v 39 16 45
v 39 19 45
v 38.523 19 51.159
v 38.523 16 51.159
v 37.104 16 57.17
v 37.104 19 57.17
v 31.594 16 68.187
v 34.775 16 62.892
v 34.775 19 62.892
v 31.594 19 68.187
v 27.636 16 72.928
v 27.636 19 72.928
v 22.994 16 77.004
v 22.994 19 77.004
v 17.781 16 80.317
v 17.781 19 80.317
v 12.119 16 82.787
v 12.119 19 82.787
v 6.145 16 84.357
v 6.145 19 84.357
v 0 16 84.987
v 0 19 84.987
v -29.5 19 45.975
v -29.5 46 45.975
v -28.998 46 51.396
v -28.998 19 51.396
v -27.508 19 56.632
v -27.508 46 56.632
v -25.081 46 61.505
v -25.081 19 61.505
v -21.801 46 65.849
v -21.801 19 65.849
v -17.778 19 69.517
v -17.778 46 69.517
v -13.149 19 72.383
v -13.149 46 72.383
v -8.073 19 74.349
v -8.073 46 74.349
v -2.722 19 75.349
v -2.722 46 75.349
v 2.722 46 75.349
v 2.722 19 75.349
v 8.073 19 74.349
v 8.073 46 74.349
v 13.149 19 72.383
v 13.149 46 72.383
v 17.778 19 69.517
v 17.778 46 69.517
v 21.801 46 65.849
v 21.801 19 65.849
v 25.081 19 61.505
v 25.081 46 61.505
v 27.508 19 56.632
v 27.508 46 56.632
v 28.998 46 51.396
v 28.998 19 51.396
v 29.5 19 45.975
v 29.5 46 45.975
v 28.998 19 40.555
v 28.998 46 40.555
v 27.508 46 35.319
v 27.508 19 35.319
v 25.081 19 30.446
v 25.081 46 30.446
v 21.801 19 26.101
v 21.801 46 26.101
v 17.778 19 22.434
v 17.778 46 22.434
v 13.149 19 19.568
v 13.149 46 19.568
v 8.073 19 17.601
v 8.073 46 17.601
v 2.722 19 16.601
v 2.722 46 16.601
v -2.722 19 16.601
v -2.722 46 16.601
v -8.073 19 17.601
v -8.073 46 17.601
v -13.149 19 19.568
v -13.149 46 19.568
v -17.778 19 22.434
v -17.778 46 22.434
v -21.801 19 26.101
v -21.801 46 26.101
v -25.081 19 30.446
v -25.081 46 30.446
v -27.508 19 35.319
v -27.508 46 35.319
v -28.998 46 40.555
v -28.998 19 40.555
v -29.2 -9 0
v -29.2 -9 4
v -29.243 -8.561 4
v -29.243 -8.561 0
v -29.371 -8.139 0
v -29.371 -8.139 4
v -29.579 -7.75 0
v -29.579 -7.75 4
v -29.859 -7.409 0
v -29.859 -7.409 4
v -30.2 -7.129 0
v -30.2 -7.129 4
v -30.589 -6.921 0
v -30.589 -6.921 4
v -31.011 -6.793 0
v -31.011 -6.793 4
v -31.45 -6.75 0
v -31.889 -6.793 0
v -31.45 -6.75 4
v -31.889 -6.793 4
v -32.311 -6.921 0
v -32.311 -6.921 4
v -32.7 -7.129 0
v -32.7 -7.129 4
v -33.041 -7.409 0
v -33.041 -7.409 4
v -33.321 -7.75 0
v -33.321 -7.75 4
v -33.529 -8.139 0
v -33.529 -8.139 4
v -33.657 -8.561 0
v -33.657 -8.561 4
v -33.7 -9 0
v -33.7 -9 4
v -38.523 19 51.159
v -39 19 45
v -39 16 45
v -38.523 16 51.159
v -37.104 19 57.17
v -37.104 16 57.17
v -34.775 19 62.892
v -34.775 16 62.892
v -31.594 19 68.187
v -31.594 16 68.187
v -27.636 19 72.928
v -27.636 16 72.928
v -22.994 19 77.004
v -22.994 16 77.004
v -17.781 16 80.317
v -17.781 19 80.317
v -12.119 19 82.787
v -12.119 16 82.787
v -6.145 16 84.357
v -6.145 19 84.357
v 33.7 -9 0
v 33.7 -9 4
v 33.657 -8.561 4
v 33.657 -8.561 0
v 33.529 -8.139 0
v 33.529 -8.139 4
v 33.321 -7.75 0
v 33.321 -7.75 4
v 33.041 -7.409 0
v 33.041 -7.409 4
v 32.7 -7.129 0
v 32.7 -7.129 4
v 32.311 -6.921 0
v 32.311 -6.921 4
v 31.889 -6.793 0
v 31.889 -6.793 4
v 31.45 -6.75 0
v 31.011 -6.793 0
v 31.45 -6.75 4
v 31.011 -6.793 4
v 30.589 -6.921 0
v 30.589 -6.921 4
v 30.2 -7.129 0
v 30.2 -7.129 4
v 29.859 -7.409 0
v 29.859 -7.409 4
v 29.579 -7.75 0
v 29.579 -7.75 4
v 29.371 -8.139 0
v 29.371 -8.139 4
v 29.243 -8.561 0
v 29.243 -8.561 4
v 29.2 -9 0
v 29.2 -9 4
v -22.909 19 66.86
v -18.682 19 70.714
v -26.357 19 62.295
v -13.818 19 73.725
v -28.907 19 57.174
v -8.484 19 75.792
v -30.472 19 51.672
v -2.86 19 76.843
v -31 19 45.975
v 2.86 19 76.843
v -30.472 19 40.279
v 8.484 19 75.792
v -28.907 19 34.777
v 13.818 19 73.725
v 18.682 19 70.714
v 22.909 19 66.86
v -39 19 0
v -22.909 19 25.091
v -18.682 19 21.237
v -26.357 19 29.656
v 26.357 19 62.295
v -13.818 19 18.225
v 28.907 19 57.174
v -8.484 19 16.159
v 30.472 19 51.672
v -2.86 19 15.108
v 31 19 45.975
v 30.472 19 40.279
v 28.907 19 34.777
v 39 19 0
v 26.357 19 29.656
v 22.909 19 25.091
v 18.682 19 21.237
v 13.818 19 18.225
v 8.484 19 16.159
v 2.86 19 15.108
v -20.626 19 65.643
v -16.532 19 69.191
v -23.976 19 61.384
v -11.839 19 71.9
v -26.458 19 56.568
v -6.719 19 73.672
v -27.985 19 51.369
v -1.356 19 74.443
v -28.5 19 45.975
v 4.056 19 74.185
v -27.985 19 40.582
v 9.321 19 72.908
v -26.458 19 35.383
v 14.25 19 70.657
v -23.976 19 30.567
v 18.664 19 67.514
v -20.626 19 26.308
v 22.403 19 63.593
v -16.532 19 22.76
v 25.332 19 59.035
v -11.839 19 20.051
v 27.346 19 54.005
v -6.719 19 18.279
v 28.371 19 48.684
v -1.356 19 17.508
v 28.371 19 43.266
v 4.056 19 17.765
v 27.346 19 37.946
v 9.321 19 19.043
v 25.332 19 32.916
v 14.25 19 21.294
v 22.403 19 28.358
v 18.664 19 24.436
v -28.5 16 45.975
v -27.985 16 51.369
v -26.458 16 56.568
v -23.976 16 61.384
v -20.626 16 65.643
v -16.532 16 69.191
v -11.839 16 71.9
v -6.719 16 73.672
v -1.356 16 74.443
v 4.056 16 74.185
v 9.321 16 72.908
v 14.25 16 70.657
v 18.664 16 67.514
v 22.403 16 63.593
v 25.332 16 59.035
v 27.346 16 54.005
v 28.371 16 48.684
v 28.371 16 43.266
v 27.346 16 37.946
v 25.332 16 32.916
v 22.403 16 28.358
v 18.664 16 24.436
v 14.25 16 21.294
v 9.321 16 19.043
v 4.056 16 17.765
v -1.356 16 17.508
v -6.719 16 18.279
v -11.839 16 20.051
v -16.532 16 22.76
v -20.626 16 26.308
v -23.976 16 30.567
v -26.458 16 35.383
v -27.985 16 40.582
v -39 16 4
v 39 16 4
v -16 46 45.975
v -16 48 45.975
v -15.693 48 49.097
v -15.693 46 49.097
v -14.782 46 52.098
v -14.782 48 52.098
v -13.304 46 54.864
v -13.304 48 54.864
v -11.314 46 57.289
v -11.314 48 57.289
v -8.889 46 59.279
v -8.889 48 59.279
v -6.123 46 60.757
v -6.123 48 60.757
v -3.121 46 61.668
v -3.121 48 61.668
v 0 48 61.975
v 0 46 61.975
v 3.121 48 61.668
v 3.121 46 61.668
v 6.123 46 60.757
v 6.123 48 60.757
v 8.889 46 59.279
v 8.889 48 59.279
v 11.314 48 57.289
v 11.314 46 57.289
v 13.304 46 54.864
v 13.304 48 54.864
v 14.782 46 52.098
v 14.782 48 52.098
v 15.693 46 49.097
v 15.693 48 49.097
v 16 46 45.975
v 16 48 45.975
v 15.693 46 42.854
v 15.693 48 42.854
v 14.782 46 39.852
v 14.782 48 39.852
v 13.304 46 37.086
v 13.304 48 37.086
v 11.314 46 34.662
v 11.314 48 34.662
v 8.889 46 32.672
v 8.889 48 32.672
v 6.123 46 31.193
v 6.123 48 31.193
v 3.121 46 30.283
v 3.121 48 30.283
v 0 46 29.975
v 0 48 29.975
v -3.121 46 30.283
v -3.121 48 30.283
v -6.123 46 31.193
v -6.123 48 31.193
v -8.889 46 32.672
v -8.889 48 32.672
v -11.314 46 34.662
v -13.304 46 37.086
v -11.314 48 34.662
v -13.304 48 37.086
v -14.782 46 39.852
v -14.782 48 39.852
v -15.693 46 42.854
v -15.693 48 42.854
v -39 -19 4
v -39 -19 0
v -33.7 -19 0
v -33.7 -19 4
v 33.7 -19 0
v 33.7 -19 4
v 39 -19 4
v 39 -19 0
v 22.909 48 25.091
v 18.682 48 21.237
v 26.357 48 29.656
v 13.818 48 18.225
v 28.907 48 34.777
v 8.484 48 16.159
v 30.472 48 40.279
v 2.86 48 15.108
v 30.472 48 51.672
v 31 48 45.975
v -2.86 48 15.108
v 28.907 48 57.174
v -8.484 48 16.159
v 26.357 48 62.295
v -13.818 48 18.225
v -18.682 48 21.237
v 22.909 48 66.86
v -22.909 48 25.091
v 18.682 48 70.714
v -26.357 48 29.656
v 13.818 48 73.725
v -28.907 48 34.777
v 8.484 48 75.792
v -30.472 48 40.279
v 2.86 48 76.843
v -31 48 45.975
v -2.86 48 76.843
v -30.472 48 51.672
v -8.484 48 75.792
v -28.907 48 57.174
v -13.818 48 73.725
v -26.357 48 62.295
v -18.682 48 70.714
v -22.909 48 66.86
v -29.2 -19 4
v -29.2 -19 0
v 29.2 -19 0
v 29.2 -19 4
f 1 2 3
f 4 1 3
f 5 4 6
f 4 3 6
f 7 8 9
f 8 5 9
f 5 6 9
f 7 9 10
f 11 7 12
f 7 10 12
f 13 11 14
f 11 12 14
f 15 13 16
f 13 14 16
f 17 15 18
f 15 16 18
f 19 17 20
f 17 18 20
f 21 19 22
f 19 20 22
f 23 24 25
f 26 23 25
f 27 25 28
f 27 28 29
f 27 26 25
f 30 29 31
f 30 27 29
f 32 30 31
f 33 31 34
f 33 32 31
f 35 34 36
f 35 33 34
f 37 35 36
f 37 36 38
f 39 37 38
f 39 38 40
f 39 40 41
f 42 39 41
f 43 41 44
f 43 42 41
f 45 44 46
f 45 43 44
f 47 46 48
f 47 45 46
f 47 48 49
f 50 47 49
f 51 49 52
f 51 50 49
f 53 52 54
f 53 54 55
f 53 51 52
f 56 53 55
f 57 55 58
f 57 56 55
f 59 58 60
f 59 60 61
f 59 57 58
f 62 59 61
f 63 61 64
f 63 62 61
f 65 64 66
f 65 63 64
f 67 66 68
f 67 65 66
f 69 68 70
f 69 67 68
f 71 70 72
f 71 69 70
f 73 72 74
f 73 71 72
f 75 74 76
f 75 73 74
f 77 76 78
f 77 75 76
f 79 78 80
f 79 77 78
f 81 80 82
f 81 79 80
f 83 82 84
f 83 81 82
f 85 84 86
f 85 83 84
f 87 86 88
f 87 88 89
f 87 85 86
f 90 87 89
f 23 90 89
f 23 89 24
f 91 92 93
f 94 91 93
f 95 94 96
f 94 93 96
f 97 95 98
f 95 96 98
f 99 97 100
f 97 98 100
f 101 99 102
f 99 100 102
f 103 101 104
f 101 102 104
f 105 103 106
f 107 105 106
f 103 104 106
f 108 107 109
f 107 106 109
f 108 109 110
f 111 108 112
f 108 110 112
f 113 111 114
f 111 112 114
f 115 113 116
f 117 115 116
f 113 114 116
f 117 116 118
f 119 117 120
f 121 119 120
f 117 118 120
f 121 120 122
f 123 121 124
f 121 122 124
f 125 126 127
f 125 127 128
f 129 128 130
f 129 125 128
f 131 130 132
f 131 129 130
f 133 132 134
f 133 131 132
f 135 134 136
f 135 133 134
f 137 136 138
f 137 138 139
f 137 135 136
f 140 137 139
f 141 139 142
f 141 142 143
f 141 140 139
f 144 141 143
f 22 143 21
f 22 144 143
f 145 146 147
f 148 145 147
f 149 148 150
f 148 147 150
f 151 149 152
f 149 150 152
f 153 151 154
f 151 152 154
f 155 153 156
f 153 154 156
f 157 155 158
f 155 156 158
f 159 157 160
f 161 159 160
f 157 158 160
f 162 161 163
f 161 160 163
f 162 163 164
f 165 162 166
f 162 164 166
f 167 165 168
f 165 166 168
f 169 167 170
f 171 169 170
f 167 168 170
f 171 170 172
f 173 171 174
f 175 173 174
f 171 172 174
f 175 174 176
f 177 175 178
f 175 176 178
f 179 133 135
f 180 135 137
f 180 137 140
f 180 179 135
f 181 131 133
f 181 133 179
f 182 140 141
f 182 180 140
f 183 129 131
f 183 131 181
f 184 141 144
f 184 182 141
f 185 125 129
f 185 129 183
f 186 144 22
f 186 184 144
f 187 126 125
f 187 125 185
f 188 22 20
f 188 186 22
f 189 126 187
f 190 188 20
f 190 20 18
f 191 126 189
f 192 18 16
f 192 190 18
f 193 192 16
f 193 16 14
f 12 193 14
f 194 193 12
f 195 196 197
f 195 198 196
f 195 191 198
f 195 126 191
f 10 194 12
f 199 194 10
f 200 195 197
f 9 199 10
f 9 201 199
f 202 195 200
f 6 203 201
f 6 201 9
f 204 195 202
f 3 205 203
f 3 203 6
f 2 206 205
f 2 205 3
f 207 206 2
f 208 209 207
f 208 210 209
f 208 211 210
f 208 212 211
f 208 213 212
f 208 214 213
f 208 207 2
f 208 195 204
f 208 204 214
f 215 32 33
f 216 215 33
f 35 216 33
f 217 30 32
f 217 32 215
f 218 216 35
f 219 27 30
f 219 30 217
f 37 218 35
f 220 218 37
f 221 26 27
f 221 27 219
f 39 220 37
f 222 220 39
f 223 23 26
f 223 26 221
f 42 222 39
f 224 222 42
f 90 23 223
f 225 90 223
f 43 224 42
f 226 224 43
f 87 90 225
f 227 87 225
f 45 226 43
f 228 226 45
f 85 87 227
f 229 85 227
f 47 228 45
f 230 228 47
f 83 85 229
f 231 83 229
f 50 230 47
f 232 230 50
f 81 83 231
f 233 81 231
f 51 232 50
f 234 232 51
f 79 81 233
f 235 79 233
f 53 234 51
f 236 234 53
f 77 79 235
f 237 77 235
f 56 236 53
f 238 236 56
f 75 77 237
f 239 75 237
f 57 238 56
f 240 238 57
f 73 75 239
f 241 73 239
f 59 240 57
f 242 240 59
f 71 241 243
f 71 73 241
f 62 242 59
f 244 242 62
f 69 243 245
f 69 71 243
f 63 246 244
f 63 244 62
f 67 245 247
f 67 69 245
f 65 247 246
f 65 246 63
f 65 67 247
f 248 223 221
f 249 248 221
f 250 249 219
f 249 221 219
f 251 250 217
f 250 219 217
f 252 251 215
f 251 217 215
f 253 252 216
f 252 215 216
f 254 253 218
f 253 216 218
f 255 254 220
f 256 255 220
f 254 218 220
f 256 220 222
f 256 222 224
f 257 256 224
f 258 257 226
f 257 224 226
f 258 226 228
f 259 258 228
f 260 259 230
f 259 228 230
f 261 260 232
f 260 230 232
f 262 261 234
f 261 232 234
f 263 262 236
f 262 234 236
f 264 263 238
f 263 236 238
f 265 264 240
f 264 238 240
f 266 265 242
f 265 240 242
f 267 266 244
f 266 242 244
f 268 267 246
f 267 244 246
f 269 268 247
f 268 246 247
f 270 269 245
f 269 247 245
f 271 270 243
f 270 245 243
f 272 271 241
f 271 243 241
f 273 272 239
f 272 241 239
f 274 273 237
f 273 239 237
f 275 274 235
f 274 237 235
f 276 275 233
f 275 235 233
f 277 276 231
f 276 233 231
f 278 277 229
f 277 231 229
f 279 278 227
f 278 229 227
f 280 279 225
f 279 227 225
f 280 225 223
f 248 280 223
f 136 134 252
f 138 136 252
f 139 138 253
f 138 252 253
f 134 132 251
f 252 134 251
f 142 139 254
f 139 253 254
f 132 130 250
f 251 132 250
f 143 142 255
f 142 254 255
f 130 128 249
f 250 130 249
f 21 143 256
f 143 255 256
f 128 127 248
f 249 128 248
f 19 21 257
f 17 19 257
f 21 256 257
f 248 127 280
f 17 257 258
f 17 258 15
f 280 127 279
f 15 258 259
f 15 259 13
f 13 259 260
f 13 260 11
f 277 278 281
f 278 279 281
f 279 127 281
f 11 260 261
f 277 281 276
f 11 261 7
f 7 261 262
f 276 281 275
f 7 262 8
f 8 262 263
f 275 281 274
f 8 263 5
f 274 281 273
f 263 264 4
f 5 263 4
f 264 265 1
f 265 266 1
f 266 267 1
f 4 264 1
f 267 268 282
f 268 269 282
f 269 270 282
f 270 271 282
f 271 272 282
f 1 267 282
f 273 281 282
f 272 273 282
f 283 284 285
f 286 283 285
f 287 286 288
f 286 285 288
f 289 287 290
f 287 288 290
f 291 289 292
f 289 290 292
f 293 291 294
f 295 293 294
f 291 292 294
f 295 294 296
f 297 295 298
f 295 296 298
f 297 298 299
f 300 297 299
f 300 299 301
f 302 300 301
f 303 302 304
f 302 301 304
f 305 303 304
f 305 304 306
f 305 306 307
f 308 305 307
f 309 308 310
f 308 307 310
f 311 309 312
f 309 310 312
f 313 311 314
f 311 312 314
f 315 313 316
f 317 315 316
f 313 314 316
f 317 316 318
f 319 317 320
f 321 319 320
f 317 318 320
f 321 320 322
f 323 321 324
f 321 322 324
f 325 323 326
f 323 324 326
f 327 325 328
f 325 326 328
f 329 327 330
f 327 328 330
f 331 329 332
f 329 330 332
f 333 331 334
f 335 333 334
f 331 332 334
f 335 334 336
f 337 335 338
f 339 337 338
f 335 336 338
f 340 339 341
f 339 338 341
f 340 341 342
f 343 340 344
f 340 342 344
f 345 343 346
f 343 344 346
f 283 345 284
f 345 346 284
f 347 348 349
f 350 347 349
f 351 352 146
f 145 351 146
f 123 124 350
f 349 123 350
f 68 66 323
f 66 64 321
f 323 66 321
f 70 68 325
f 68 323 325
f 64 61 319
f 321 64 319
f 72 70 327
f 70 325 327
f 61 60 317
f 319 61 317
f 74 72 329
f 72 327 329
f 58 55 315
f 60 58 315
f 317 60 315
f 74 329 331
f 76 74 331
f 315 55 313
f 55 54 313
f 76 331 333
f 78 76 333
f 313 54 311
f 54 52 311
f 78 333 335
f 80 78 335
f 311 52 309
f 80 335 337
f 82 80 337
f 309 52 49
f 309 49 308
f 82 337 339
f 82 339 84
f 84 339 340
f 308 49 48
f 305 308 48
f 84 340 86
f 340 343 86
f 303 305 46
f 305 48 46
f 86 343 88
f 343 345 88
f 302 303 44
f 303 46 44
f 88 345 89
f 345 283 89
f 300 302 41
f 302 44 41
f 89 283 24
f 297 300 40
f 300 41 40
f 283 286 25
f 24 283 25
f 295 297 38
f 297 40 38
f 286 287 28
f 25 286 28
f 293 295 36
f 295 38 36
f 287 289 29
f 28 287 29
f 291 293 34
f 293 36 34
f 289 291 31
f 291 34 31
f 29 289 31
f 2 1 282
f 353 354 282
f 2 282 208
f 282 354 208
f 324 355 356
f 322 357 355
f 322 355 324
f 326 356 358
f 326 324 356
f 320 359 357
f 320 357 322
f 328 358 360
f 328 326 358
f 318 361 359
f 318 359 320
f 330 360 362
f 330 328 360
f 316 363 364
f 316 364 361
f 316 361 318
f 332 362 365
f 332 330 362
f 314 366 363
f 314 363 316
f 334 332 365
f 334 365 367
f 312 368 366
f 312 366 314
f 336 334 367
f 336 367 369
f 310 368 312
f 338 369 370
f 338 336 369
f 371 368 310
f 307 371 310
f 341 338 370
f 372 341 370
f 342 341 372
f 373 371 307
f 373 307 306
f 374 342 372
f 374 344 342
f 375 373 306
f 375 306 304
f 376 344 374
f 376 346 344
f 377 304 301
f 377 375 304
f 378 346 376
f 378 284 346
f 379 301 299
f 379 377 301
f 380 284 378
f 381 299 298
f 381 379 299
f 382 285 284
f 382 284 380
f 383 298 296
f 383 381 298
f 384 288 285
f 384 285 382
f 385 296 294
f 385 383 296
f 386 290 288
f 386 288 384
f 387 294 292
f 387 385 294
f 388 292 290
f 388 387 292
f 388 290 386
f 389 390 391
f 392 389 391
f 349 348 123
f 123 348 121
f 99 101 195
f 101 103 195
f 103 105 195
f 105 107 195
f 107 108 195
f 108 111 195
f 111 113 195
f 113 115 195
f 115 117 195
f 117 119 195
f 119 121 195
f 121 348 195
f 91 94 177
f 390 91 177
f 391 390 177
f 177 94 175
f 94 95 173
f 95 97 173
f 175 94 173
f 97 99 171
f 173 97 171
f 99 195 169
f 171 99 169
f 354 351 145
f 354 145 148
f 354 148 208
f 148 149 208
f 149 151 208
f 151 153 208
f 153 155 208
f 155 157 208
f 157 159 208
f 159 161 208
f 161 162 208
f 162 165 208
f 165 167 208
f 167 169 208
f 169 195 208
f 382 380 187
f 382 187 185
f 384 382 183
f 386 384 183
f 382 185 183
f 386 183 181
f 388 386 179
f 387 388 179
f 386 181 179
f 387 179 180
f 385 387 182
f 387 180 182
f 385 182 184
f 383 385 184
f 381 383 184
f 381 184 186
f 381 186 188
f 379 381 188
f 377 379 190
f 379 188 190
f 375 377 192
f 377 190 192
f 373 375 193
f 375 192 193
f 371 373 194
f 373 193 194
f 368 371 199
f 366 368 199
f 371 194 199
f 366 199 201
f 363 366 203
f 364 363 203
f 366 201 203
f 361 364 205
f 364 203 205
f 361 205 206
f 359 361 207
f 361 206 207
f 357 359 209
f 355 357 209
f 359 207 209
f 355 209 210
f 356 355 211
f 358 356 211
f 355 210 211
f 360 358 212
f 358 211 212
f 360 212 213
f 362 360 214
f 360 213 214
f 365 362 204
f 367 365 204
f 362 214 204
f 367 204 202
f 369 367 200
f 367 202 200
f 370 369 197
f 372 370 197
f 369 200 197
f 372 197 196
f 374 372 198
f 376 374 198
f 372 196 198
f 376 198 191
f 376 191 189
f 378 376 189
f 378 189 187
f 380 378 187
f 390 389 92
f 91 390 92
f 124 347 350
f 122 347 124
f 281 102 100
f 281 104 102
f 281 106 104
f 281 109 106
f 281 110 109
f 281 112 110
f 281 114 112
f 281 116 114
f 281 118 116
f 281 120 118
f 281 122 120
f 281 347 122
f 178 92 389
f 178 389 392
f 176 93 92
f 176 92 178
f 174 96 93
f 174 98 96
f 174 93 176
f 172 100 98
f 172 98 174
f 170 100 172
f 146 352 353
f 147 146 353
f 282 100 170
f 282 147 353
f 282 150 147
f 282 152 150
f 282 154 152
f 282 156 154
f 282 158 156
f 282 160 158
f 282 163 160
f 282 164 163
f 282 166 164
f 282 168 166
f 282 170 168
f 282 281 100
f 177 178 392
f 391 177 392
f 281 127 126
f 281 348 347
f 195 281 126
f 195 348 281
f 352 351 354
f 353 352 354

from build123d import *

# Parameters (mm, degrees)
F0_W        = 78
F0_H        = 38
F1_DEPTH    = 4
F2_W        = 78
F2_H        = 3
F3_DEPTH    = 81
F4_T1_DEPTH = 203
F5_R        = 31
F5_R_2      = 29.5
F6_DEPTH    = 27
F7_R        = 28.5
F8_DEPTH    = 3
F9_R        = 31
F10_DEPTH   = 2
F11_R       = 16
F12_DEPTH   = 2
F14_DEPTH   = 4


# Not quite as in the source:
# - a fillet or chamfer that OpenCascade refuses, or shapes differently, is made with other operations: its cross-section is extruded or revolved along the edge and cut away or added


with BuildPart() as f1:
    # F0 (on Top) → F1 (new body)
    with BuildSketch(Plane.XY):
        Rectangle(F0_W, F0_H)
    extrude(amount=F1_DEPTH)

    # F2 (on face) → F3 (join)
    with BuildSketch(Plane.XY.offset(4)):
        with Locations((0, 17.5)):
            Rectangle(F2_W, F2_H)
    extrude(amount=F3_DEPTH)

    # F4: fillet of radius 40 on 2 edges, made by hand

    # F4_s2 → F4_t1 (cut)
    with BuildSketch(Plane.XZ.offset(-119)):
        with BuildLine():
            ThreePointArc((39, 45), (27.2842712475, 73.2842712475), (-1, 85))
            Line((-1, 85), (39, 85))
            Line((39, 85), (39, 45))
        make_face()
        with BuildLine():
            ThreePointArc((-39, 45), (-27.2842712475, 73.2842712475), (1, 85))
            Line((1, 85), (-39, 85))
            Line((-39, 85), (-39, 45))
        make_face()
    extrude(amount=F4_T1_DEPTH, mode=Mode.SUBTRACT)

    # F5 (on face) → F6 (join)
    with BuildSketch(Plane(origin=(0, 19, 0), x_dir=(-1, 0, 0), z_dir=(0, 1, 0))):
        with Locations((0, 45.9753048304)):
            Circle(F5_R)
        with Locations((0, 45.9753048304)):
            Circle(F5_R_2, mode=Mode.SUBTRACT)
    extrude(amount=F6_DEPTH)

    # F7 (on face) → F8 (cut, through all)
    with BuildSketch(Plane(origin=(0, 19, 0), x_dir=(-1, 0, 0), z_dir=(0, 1, 0))):
        with Locations((0, 45.9753048304)):
            Circle(F7_R)
    extrude(amount=-F8_DEPTH, mode=Mode.SUBTRACT)

    # F9 (on face) → F10 (join)
    with BuildSketch(Plane(origin=(0, 46, 0), x_dir=(-1, 0, 0), z_dir=(0, 1, 0))):
        with Locations((0, 45.9753048304)):
            Circle(F9_R)
    extrude(amount=F10_DEPTH)

    # F11 (on face) → F12 (cut, through all)
    with BuildSketch(Plane(origin=(0, 48, 0), x_dir=(-1, 0, 0), z_dir=(0, 1, 0))):
        with Locations((0, 45.9753048304)):
            Circle(F11_R)
    extrude(amount=-F12_DEPTH, mode=Mode.SUBTRACT)

    # F13 (on face) → F14 (cut, through all)
    with BuildSketch(Plane.XY.offset(4)):
        with BuildLine():
            Line((29.2, -19), (33.7, -19))
            Line((33.7, -19), (33.7, -9))
            ThreePointArc((33.7, -9), (31.45, -11.25), (29.2, -9))
            Line((29.2, -9), (29.2, -19))
        make_face()
        with BuildLine():
            ThreePointArc((29.2, -9), (31.45, -11.25), (33.7, -9))
            Line((33.7, -9), (29.2, -9))
        make_face()
        with BuildLine():
            Line((29.2, -9), (33.7, -9))
            ThreePointArc((33.7, -9), (31.45, -6.75), (29.2, -9))
        make_face()
        with BuildLine():
            ThreePointArc((-29.2, -9), (-31.45, -6.75), (-33.7, -9))
            Line((-33.7, -9), (-29.2, -9))
        make_face()
        with BuildLine():
            ThreePointArc((-29.2, -9), (-31.45, -11.25), (-33.7, -9))
            Line((-33.7, -9), (-33.7, -19))
            Line((-33.7, -19), (-29.2, -19))
            Line((-29.2, -19), (-29.2, -9))
        make_face()
        with BuildLine():
            Line((-29.2, -9), (-33.7, -9))
            ThreePointArc((-33.7, -9), (-31.45, -11.25), (-29.2, -9))
        make_face()
    extrude(amount=-F14_DEPTH, mode=Mode.SUBTRACT)


solid = f1.part
